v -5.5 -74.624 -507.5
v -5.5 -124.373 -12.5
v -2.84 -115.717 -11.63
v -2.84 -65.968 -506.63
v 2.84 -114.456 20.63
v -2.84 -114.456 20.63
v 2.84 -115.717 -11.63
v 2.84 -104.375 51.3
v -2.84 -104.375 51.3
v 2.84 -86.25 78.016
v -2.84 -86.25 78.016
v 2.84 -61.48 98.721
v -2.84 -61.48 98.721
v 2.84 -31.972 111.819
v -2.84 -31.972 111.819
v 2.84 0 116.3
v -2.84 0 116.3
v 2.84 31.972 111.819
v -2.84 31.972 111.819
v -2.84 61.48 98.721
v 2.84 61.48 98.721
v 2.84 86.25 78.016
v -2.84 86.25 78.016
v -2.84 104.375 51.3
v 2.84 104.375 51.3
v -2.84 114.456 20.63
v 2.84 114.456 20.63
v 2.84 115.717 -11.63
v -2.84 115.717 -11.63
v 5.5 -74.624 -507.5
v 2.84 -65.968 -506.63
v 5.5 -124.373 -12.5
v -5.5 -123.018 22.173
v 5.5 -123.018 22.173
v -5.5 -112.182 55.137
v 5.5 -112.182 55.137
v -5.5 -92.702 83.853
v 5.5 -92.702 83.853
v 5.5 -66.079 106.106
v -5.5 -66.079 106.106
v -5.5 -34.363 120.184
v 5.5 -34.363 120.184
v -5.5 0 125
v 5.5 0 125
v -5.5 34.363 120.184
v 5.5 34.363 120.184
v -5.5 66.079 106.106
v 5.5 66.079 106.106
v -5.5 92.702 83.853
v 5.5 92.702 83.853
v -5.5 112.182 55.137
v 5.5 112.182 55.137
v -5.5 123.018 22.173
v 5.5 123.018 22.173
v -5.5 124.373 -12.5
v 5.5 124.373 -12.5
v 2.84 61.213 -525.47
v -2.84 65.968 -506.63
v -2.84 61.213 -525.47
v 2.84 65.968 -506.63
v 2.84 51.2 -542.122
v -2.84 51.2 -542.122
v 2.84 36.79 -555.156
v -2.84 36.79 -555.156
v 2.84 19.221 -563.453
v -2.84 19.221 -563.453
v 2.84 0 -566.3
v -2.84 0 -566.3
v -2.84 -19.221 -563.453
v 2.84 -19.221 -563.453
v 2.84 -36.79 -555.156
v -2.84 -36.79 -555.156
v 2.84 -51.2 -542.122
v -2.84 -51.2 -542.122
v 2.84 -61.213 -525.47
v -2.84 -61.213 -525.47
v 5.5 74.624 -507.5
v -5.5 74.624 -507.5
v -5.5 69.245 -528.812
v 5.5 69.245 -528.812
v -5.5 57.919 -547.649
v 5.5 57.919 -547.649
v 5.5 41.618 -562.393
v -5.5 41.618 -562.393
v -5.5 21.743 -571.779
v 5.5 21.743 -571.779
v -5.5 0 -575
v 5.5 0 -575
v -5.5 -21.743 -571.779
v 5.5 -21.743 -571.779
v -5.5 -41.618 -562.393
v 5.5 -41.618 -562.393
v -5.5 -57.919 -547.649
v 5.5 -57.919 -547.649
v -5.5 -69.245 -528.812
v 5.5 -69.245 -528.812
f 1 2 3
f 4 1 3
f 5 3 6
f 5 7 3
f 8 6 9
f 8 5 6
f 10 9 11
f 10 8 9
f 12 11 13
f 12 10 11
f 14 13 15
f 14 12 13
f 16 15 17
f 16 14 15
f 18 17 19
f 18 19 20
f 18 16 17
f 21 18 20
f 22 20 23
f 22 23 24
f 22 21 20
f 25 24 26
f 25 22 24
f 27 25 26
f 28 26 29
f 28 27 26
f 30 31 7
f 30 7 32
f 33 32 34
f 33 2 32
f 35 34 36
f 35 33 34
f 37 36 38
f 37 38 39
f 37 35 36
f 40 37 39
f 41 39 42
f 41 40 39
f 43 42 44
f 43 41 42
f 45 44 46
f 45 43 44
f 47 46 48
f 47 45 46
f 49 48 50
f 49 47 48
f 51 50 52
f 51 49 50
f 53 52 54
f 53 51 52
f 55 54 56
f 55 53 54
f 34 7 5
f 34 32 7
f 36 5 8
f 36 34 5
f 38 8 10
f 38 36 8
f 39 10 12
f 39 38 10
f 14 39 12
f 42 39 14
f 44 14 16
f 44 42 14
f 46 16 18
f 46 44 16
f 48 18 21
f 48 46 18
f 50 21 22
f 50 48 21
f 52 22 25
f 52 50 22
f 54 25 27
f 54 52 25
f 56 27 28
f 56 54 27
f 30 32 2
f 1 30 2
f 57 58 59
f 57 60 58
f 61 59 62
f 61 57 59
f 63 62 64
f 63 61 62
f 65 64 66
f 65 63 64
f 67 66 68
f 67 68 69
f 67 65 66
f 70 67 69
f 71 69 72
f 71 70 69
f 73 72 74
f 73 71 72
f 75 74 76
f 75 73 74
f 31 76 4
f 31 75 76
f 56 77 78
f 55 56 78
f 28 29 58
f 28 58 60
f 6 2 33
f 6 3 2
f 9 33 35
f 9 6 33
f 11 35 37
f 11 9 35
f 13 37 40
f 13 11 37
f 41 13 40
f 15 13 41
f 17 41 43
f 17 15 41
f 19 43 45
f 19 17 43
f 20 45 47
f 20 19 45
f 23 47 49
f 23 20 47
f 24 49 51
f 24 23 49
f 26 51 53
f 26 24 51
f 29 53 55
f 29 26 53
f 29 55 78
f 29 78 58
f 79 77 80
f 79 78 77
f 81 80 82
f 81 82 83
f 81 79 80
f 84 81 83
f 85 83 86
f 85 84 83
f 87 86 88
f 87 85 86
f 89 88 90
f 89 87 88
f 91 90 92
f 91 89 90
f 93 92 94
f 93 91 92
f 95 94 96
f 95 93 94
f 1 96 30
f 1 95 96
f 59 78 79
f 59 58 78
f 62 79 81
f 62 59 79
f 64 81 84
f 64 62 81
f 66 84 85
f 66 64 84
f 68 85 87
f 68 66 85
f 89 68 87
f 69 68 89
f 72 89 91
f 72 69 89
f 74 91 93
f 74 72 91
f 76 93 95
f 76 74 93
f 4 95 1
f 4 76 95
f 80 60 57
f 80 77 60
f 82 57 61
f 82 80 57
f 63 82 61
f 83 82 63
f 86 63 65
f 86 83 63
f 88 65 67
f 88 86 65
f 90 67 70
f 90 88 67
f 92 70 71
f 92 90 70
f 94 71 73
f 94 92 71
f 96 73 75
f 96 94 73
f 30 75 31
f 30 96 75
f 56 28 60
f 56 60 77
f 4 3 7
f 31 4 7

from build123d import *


with BuildPart() as part:
    # 扫描1: sweep along a path in 草图1
    with BuildLine(Plane(origin=(0, 0, 0), x_dir=(0, 0, -1), z_dir=(1, 0, 0))) as sweep_1_path:
        Line((12.5, 124.373429638), (507.5, 74.624057783))
        ThreePointArc((507.5, 74.624057783), (575, 0), (507.5, -74.624057783))
        Line((507.5, -74.624057783), (12.5, -124.373429638))
        ThreePointArc((12.5, -124.373429638), (-125, 0), (12.5, 124.373429638))
    # 草图2 → 扫描1 (sweep)
    with BuildSketch(Plane.XY):
        Polygon((-5.5, 125), (5.5, 125), (2.840143071, 116.3), (-2.840143071, 116.3), align=None)
    sweep(path=sweep_1_path.line)


solid = part.part
